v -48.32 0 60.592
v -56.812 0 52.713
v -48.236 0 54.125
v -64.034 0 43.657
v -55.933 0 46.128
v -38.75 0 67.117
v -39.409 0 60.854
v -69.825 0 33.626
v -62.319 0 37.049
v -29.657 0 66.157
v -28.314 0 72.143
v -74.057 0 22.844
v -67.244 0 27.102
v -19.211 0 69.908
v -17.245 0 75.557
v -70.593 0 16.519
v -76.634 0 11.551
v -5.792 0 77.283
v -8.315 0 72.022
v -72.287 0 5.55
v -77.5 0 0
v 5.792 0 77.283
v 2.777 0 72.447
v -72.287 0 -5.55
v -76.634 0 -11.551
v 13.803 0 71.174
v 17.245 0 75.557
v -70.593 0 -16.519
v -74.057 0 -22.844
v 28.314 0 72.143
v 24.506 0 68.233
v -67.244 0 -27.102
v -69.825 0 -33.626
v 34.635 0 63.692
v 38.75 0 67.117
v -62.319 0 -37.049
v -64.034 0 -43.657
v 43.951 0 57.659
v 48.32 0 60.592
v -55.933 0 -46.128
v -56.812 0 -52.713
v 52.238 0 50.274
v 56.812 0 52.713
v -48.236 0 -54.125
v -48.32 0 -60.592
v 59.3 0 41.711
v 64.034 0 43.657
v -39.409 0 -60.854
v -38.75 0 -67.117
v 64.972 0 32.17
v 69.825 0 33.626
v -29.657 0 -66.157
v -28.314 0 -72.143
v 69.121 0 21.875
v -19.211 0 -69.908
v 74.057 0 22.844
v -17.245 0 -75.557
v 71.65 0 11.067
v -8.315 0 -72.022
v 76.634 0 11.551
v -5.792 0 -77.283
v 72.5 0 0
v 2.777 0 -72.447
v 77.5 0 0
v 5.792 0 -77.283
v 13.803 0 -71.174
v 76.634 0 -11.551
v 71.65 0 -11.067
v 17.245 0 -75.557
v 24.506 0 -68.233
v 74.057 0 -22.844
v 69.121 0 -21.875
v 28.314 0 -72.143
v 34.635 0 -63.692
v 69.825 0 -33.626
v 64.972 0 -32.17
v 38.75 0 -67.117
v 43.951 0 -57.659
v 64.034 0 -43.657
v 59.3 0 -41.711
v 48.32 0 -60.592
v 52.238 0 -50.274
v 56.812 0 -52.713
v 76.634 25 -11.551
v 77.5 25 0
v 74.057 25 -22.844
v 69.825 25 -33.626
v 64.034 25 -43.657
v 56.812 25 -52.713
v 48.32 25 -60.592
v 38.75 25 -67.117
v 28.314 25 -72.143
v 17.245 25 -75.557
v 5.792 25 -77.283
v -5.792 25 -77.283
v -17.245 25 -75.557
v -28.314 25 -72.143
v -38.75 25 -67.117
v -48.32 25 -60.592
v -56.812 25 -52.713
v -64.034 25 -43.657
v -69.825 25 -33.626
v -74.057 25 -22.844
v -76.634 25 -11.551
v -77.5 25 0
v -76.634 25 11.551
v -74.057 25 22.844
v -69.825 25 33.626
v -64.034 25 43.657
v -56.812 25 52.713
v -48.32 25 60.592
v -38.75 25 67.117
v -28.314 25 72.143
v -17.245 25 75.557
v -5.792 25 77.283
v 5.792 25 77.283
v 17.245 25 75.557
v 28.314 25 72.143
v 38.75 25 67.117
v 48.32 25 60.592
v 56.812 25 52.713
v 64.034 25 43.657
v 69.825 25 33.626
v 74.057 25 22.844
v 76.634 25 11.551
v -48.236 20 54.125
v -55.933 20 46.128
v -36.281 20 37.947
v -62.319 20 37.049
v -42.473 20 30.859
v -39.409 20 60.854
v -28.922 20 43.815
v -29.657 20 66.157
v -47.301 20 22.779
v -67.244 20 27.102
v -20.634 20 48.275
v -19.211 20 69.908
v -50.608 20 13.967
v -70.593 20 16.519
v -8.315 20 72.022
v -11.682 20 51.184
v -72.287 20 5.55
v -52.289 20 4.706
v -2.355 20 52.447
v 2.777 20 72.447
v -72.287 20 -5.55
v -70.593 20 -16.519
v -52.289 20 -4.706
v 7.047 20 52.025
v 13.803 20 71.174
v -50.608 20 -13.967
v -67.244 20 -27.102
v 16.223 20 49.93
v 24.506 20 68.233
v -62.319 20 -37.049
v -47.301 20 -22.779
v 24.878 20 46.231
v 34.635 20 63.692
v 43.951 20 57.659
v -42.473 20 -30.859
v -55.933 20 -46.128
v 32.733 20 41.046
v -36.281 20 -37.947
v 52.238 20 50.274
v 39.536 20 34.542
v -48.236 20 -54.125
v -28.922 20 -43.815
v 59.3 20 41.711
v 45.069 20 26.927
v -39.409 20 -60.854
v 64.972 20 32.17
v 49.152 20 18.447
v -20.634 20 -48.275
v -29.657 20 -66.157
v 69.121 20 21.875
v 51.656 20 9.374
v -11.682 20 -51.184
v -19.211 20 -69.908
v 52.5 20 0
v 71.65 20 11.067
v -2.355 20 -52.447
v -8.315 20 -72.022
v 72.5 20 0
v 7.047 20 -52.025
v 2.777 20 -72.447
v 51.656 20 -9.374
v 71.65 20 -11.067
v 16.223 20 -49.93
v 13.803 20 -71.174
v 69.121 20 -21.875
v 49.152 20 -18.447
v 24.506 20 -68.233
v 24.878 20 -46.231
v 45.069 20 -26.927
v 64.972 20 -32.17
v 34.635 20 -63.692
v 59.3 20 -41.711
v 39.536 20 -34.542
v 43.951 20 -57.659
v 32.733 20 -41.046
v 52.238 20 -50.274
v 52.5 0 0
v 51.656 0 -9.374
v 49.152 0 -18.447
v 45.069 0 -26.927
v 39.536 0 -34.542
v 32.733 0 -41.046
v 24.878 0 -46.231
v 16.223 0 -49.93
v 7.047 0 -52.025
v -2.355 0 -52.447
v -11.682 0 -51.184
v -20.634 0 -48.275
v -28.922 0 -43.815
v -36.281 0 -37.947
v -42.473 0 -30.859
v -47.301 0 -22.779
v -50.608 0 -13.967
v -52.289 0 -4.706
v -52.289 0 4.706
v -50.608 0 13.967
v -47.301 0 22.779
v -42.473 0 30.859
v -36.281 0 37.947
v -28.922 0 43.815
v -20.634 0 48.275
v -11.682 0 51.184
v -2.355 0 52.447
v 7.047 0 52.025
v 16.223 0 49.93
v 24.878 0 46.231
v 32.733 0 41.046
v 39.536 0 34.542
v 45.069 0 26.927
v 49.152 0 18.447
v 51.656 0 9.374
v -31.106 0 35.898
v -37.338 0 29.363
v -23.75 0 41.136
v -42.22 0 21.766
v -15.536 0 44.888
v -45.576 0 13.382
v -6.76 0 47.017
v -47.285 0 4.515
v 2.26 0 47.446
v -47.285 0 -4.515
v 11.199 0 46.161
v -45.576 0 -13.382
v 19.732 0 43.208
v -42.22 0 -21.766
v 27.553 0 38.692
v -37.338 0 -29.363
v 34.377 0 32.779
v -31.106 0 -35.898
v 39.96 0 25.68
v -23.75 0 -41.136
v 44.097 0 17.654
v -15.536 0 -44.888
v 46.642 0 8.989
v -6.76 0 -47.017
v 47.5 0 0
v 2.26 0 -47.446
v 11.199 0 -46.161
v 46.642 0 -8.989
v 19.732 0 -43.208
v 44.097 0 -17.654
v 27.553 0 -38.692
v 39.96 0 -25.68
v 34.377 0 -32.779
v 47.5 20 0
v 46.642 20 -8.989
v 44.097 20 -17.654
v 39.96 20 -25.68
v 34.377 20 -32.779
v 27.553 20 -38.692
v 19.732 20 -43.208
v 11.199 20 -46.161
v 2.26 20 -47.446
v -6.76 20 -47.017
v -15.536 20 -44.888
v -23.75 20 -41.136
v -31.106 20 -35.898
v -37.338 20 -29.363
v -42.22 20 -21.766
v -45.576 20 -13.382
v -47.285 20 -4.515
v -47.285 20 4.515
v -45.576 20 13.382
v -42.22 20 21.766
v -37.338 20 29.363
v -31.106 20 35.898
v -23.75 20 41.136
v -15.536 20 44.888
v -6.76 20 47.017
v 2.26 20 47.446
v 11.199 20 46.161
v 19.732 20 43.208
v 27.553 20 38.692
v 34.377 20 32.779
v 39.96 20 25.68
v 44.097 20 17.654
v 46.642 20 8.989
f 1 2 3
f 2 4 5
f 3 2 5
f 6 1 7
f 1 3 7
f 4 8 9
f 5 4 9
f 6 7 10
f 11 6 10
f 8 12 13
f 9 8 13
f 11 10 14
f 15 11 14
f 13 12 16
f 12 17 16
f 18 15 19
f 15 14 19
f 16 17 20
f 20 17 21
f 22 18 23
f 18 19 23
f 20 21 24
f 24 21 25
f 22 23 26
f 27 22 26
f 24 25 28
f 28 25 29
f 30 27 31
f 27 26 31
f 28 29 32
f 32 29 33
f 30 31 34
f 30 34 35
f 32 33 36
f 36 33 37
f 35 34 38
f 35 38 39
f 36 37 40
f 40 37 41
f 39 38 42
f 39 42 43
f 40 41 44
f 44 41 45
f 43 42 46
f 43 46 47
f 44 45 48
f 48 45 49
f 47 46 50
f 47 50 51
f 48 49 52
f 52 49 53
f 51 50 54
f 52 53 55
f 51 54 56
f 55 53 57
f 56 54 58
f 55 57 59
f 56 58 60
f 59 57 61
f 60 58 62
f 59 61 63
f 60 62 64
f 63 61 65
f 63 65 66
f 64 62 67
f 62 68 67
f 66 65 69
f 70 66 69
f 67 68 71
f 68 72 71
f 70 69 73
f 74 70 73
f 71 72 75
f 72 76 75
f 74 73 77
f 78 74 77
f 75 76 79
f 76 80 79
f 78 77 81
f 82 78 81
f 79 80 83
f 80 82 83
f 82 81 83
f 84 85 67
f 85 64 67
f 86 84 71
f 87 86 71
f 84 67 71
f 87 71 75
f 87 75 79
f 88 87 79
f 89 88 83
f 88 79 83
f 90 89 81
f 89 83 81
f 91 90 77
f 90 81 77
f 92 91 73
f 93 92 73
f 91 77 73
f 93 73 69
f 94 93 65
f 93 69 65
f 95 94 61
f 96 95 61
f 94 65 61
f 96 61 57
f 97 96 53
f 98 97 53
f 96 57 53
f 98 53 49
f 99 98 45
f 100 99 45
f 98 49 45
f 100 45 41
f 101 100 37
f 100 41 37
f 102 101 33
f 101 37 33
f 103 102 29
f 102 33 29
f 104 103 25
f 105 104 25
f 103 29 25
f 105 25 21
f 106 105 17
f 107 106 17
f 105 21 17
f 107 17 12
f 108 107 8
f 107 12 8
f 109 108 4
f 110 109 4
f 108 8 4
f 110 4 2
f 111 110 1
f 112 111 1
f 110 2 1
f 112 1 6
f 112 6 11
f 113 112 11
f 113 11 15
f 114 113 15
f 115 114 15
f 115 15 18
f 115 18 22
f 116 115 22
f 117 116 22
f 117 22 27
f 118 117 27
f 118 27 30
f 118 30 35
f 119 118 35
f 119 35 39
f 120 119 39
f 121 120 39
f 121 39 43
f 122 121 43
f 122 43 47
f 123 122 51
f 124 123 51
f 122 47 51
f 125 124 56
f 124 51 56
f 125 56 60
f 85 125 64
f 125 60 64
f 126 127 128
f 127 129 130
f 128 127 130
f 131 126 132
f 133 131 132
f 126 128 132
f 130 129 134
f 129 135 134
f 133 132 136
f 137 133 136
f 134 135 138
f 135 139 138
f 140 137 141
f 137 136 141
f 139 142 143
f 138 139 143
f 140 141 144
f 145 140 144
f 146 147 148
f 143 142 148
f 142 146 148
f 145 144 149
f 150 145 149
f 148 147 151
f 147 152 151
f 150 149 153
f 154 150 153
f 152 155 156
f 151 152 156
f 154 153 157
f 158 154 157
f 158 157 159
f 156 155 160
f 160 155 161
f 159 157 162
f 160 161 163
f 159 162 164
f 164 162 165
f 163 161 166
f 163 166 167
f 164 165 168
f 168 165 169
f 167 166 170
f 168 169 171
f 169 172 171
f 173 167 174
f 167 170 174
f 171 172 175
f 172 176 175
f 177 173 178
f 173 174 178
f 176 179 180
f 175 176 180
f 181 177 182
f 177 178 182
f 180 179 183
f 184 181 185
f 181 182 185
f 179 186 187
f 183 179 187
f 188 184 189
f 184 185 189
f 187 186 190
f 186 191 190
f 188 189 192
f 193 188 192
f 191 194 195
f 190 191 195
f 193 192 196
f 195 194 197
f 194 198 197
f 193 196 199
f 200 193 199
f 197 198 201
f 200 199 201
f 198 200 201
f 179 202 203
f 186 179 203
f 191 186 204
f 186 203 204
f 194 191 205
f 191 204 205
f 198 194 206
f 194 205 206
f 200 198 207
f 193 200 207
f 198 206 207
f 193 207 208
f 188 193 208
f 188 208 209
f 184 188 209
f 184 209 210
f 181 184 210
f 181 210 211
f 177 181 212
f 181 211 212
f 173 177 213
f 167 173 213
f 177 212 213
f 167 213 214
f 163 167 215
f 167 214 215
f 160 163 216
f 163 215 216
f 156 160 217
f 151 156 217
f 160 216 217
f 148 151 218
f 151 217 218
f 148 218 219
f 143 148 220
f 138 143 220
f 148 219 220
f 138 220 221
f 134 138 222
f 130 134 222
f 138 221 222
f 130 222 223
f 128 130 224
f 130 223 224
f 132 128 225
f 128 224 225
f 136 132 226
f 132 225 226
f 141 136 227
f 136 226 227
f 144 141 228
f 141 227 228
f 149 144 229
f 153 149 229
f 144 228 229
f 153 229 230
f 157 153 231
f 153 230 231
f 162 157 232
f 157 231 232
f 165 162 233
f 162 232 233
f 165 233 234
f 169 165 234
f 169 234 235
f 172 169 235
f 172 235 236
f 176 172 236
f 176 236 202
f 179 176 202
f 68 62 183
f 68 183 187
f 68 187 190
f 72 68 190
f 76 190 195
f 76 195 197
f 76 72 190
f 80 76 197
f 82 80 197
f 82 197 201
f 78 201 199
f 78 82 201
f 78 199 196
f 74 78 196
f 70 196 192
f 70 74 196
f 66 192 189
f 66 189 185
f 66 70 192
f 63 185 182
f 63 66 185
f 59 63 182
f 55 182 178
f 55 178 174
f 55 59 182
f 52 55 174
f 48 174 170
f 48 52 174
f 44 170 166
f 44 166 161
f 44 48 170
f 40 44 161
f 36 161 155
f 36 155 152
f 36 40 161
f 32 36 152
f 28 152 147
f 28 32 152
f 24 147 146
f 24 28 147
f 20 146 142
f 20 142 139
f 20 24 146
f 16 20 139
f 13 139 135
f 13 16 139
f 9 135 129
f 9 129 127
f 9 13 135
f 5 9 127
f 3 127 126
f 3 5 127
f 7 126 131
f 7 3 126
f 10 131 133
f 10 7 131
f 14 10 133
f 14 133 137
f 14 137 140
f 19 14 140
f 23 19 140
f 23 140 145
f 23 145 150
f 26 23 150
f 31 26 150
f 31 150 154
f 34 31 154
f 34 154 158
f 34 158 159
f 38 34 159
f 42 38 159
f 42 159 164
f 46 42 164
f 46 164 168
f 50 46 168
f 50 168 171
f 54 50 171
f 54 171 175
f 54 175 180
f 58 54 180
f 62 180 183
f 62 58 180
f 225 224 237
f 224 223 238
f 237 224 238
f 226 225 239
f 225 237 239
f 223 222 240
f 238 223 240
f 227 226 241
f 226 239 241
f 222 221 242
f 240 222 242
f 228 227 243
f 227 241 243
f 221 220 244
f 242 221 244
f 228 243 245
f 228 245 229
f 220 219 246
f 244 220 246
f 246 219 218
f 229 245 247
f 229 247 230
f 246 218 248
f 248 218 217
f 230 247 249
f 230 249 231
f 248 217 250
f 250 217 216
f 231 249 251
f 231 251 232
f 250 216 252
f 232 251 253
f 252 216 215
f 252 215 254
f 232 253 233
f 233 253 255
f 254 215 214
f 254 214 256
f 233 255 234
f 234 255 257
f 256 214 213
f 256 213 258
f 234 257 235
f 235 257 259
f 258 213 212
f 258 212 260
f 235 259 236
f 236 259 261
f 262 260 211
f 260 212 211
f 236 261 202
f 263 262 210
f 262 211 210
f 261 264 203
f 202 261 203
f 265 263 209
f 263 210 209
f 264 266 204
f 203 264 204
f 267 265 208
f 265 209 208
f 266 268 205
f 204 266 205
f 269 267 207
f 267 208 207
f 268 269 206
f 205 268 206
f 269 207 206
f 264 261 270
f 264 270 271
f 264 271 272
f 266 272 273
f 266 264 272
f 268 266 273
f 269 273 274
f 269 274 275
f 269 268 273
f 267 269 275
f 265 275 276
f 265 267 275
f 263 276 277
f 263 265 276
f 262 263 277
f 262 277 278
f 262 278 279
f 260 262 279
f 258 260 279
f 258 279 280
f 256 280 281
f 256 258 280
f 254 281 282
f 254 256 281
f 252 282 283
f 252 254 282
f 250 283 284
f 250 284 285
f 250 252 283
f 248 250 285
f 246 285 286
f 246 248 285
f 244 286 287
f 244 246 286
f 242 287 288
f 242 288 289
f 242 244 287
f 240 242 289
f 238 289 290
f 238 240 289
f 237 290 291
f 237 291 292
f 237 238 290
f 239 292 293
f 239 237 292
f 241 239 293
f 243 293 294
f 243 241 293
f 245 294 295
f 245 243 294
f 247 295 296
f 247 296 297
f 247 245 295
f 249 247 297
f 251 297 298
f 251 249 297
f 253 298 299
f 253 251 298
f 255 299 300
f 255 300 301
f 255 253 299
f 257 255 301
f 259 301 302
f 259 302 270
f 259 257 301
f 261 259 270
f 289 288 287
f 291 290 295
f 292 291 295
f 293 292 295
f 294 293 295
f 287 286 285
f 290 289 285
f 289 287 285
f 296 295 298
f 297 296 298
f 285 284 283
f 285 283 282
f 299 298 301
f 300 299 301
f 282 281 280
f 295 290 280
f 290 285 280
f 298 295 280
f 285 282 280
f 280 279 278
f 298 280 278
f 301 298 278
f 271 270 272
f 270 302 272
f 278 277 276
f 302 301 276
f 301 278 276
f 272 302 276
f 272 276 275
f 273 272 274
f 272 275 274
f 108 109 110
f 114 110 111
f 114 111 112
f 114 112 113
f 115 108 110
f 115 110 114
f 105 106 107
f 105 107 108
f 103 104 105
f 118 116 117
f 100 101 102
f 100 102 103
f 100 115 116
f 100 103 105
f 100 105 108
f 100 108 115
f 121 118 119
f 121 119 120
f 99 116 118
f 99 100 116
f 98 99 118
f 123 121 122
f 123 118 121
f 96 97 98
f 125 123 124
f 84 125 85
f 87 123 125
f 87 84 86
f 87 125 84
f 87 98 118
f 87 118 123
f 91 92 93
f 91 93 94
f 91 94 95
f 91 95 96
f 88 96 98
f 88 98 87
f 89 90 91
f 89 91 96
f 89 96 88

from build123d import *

# Parameters (mm, degrees)
SKETCH2_R             = 52.5
SKETCH2_R_2           = 47.5
BOSS_EXTRUDE1_DEPTH   = 20
SKETCH2_R_3           = 77.5
SKETCH2_R_4           = 72.5
BOSS_EXTRUDE1_2_DEPTH = 20
SKETCH3_R             = 77.5
BOSS_EXTRUDE2_DEPTH   = 5


with BuildPart() as part:
    # Sketch2 → Boss-Extrude1 (new body)
    with BuildSketch(Plane(origin=(0, 0, 0), x_dir=(1, 0, 0), z_dir=(0, 1, 0))):
        Circle(SKETCH2_R)
        Circle(SKETCH2_R_2, mode=Mode.SUBTRACT)
    extrude(amount=BOSS_EXTRUDE1_DEPTH)



with BuildPart() as body_2:
    # Sketch2 → Boss-Extrude1 2 (new body)
    with BuildSketch(Plane(origin=(0, 0, 0), x_dir=(1, 0, 0), z_dir=(0, 1, 0))):
        Circle(SKETCH2_R_3)
        Circle(SKETCH2_R_4, mode=Mode.SUBTRACT)
    extrude(amount=BOSS_EXTRUDE1_2_DEPTH)


with BuildPart() as part_1:
    add(part.part)

    add(body_2.part)  # Boss-Extrude2 merges body 2
    # Sketch3 → Boss-Extrude2 (add)
    with BuildSketch(Plane(origin=(0, 20, 0), x_dir=(1, 0, 0), z_dir=(0, 1, 0))):
        Circle(SKETCH3_R)
    extrude(amount=BOSS_EXTRUDE2_DEPTH)


solid = part_1.part
